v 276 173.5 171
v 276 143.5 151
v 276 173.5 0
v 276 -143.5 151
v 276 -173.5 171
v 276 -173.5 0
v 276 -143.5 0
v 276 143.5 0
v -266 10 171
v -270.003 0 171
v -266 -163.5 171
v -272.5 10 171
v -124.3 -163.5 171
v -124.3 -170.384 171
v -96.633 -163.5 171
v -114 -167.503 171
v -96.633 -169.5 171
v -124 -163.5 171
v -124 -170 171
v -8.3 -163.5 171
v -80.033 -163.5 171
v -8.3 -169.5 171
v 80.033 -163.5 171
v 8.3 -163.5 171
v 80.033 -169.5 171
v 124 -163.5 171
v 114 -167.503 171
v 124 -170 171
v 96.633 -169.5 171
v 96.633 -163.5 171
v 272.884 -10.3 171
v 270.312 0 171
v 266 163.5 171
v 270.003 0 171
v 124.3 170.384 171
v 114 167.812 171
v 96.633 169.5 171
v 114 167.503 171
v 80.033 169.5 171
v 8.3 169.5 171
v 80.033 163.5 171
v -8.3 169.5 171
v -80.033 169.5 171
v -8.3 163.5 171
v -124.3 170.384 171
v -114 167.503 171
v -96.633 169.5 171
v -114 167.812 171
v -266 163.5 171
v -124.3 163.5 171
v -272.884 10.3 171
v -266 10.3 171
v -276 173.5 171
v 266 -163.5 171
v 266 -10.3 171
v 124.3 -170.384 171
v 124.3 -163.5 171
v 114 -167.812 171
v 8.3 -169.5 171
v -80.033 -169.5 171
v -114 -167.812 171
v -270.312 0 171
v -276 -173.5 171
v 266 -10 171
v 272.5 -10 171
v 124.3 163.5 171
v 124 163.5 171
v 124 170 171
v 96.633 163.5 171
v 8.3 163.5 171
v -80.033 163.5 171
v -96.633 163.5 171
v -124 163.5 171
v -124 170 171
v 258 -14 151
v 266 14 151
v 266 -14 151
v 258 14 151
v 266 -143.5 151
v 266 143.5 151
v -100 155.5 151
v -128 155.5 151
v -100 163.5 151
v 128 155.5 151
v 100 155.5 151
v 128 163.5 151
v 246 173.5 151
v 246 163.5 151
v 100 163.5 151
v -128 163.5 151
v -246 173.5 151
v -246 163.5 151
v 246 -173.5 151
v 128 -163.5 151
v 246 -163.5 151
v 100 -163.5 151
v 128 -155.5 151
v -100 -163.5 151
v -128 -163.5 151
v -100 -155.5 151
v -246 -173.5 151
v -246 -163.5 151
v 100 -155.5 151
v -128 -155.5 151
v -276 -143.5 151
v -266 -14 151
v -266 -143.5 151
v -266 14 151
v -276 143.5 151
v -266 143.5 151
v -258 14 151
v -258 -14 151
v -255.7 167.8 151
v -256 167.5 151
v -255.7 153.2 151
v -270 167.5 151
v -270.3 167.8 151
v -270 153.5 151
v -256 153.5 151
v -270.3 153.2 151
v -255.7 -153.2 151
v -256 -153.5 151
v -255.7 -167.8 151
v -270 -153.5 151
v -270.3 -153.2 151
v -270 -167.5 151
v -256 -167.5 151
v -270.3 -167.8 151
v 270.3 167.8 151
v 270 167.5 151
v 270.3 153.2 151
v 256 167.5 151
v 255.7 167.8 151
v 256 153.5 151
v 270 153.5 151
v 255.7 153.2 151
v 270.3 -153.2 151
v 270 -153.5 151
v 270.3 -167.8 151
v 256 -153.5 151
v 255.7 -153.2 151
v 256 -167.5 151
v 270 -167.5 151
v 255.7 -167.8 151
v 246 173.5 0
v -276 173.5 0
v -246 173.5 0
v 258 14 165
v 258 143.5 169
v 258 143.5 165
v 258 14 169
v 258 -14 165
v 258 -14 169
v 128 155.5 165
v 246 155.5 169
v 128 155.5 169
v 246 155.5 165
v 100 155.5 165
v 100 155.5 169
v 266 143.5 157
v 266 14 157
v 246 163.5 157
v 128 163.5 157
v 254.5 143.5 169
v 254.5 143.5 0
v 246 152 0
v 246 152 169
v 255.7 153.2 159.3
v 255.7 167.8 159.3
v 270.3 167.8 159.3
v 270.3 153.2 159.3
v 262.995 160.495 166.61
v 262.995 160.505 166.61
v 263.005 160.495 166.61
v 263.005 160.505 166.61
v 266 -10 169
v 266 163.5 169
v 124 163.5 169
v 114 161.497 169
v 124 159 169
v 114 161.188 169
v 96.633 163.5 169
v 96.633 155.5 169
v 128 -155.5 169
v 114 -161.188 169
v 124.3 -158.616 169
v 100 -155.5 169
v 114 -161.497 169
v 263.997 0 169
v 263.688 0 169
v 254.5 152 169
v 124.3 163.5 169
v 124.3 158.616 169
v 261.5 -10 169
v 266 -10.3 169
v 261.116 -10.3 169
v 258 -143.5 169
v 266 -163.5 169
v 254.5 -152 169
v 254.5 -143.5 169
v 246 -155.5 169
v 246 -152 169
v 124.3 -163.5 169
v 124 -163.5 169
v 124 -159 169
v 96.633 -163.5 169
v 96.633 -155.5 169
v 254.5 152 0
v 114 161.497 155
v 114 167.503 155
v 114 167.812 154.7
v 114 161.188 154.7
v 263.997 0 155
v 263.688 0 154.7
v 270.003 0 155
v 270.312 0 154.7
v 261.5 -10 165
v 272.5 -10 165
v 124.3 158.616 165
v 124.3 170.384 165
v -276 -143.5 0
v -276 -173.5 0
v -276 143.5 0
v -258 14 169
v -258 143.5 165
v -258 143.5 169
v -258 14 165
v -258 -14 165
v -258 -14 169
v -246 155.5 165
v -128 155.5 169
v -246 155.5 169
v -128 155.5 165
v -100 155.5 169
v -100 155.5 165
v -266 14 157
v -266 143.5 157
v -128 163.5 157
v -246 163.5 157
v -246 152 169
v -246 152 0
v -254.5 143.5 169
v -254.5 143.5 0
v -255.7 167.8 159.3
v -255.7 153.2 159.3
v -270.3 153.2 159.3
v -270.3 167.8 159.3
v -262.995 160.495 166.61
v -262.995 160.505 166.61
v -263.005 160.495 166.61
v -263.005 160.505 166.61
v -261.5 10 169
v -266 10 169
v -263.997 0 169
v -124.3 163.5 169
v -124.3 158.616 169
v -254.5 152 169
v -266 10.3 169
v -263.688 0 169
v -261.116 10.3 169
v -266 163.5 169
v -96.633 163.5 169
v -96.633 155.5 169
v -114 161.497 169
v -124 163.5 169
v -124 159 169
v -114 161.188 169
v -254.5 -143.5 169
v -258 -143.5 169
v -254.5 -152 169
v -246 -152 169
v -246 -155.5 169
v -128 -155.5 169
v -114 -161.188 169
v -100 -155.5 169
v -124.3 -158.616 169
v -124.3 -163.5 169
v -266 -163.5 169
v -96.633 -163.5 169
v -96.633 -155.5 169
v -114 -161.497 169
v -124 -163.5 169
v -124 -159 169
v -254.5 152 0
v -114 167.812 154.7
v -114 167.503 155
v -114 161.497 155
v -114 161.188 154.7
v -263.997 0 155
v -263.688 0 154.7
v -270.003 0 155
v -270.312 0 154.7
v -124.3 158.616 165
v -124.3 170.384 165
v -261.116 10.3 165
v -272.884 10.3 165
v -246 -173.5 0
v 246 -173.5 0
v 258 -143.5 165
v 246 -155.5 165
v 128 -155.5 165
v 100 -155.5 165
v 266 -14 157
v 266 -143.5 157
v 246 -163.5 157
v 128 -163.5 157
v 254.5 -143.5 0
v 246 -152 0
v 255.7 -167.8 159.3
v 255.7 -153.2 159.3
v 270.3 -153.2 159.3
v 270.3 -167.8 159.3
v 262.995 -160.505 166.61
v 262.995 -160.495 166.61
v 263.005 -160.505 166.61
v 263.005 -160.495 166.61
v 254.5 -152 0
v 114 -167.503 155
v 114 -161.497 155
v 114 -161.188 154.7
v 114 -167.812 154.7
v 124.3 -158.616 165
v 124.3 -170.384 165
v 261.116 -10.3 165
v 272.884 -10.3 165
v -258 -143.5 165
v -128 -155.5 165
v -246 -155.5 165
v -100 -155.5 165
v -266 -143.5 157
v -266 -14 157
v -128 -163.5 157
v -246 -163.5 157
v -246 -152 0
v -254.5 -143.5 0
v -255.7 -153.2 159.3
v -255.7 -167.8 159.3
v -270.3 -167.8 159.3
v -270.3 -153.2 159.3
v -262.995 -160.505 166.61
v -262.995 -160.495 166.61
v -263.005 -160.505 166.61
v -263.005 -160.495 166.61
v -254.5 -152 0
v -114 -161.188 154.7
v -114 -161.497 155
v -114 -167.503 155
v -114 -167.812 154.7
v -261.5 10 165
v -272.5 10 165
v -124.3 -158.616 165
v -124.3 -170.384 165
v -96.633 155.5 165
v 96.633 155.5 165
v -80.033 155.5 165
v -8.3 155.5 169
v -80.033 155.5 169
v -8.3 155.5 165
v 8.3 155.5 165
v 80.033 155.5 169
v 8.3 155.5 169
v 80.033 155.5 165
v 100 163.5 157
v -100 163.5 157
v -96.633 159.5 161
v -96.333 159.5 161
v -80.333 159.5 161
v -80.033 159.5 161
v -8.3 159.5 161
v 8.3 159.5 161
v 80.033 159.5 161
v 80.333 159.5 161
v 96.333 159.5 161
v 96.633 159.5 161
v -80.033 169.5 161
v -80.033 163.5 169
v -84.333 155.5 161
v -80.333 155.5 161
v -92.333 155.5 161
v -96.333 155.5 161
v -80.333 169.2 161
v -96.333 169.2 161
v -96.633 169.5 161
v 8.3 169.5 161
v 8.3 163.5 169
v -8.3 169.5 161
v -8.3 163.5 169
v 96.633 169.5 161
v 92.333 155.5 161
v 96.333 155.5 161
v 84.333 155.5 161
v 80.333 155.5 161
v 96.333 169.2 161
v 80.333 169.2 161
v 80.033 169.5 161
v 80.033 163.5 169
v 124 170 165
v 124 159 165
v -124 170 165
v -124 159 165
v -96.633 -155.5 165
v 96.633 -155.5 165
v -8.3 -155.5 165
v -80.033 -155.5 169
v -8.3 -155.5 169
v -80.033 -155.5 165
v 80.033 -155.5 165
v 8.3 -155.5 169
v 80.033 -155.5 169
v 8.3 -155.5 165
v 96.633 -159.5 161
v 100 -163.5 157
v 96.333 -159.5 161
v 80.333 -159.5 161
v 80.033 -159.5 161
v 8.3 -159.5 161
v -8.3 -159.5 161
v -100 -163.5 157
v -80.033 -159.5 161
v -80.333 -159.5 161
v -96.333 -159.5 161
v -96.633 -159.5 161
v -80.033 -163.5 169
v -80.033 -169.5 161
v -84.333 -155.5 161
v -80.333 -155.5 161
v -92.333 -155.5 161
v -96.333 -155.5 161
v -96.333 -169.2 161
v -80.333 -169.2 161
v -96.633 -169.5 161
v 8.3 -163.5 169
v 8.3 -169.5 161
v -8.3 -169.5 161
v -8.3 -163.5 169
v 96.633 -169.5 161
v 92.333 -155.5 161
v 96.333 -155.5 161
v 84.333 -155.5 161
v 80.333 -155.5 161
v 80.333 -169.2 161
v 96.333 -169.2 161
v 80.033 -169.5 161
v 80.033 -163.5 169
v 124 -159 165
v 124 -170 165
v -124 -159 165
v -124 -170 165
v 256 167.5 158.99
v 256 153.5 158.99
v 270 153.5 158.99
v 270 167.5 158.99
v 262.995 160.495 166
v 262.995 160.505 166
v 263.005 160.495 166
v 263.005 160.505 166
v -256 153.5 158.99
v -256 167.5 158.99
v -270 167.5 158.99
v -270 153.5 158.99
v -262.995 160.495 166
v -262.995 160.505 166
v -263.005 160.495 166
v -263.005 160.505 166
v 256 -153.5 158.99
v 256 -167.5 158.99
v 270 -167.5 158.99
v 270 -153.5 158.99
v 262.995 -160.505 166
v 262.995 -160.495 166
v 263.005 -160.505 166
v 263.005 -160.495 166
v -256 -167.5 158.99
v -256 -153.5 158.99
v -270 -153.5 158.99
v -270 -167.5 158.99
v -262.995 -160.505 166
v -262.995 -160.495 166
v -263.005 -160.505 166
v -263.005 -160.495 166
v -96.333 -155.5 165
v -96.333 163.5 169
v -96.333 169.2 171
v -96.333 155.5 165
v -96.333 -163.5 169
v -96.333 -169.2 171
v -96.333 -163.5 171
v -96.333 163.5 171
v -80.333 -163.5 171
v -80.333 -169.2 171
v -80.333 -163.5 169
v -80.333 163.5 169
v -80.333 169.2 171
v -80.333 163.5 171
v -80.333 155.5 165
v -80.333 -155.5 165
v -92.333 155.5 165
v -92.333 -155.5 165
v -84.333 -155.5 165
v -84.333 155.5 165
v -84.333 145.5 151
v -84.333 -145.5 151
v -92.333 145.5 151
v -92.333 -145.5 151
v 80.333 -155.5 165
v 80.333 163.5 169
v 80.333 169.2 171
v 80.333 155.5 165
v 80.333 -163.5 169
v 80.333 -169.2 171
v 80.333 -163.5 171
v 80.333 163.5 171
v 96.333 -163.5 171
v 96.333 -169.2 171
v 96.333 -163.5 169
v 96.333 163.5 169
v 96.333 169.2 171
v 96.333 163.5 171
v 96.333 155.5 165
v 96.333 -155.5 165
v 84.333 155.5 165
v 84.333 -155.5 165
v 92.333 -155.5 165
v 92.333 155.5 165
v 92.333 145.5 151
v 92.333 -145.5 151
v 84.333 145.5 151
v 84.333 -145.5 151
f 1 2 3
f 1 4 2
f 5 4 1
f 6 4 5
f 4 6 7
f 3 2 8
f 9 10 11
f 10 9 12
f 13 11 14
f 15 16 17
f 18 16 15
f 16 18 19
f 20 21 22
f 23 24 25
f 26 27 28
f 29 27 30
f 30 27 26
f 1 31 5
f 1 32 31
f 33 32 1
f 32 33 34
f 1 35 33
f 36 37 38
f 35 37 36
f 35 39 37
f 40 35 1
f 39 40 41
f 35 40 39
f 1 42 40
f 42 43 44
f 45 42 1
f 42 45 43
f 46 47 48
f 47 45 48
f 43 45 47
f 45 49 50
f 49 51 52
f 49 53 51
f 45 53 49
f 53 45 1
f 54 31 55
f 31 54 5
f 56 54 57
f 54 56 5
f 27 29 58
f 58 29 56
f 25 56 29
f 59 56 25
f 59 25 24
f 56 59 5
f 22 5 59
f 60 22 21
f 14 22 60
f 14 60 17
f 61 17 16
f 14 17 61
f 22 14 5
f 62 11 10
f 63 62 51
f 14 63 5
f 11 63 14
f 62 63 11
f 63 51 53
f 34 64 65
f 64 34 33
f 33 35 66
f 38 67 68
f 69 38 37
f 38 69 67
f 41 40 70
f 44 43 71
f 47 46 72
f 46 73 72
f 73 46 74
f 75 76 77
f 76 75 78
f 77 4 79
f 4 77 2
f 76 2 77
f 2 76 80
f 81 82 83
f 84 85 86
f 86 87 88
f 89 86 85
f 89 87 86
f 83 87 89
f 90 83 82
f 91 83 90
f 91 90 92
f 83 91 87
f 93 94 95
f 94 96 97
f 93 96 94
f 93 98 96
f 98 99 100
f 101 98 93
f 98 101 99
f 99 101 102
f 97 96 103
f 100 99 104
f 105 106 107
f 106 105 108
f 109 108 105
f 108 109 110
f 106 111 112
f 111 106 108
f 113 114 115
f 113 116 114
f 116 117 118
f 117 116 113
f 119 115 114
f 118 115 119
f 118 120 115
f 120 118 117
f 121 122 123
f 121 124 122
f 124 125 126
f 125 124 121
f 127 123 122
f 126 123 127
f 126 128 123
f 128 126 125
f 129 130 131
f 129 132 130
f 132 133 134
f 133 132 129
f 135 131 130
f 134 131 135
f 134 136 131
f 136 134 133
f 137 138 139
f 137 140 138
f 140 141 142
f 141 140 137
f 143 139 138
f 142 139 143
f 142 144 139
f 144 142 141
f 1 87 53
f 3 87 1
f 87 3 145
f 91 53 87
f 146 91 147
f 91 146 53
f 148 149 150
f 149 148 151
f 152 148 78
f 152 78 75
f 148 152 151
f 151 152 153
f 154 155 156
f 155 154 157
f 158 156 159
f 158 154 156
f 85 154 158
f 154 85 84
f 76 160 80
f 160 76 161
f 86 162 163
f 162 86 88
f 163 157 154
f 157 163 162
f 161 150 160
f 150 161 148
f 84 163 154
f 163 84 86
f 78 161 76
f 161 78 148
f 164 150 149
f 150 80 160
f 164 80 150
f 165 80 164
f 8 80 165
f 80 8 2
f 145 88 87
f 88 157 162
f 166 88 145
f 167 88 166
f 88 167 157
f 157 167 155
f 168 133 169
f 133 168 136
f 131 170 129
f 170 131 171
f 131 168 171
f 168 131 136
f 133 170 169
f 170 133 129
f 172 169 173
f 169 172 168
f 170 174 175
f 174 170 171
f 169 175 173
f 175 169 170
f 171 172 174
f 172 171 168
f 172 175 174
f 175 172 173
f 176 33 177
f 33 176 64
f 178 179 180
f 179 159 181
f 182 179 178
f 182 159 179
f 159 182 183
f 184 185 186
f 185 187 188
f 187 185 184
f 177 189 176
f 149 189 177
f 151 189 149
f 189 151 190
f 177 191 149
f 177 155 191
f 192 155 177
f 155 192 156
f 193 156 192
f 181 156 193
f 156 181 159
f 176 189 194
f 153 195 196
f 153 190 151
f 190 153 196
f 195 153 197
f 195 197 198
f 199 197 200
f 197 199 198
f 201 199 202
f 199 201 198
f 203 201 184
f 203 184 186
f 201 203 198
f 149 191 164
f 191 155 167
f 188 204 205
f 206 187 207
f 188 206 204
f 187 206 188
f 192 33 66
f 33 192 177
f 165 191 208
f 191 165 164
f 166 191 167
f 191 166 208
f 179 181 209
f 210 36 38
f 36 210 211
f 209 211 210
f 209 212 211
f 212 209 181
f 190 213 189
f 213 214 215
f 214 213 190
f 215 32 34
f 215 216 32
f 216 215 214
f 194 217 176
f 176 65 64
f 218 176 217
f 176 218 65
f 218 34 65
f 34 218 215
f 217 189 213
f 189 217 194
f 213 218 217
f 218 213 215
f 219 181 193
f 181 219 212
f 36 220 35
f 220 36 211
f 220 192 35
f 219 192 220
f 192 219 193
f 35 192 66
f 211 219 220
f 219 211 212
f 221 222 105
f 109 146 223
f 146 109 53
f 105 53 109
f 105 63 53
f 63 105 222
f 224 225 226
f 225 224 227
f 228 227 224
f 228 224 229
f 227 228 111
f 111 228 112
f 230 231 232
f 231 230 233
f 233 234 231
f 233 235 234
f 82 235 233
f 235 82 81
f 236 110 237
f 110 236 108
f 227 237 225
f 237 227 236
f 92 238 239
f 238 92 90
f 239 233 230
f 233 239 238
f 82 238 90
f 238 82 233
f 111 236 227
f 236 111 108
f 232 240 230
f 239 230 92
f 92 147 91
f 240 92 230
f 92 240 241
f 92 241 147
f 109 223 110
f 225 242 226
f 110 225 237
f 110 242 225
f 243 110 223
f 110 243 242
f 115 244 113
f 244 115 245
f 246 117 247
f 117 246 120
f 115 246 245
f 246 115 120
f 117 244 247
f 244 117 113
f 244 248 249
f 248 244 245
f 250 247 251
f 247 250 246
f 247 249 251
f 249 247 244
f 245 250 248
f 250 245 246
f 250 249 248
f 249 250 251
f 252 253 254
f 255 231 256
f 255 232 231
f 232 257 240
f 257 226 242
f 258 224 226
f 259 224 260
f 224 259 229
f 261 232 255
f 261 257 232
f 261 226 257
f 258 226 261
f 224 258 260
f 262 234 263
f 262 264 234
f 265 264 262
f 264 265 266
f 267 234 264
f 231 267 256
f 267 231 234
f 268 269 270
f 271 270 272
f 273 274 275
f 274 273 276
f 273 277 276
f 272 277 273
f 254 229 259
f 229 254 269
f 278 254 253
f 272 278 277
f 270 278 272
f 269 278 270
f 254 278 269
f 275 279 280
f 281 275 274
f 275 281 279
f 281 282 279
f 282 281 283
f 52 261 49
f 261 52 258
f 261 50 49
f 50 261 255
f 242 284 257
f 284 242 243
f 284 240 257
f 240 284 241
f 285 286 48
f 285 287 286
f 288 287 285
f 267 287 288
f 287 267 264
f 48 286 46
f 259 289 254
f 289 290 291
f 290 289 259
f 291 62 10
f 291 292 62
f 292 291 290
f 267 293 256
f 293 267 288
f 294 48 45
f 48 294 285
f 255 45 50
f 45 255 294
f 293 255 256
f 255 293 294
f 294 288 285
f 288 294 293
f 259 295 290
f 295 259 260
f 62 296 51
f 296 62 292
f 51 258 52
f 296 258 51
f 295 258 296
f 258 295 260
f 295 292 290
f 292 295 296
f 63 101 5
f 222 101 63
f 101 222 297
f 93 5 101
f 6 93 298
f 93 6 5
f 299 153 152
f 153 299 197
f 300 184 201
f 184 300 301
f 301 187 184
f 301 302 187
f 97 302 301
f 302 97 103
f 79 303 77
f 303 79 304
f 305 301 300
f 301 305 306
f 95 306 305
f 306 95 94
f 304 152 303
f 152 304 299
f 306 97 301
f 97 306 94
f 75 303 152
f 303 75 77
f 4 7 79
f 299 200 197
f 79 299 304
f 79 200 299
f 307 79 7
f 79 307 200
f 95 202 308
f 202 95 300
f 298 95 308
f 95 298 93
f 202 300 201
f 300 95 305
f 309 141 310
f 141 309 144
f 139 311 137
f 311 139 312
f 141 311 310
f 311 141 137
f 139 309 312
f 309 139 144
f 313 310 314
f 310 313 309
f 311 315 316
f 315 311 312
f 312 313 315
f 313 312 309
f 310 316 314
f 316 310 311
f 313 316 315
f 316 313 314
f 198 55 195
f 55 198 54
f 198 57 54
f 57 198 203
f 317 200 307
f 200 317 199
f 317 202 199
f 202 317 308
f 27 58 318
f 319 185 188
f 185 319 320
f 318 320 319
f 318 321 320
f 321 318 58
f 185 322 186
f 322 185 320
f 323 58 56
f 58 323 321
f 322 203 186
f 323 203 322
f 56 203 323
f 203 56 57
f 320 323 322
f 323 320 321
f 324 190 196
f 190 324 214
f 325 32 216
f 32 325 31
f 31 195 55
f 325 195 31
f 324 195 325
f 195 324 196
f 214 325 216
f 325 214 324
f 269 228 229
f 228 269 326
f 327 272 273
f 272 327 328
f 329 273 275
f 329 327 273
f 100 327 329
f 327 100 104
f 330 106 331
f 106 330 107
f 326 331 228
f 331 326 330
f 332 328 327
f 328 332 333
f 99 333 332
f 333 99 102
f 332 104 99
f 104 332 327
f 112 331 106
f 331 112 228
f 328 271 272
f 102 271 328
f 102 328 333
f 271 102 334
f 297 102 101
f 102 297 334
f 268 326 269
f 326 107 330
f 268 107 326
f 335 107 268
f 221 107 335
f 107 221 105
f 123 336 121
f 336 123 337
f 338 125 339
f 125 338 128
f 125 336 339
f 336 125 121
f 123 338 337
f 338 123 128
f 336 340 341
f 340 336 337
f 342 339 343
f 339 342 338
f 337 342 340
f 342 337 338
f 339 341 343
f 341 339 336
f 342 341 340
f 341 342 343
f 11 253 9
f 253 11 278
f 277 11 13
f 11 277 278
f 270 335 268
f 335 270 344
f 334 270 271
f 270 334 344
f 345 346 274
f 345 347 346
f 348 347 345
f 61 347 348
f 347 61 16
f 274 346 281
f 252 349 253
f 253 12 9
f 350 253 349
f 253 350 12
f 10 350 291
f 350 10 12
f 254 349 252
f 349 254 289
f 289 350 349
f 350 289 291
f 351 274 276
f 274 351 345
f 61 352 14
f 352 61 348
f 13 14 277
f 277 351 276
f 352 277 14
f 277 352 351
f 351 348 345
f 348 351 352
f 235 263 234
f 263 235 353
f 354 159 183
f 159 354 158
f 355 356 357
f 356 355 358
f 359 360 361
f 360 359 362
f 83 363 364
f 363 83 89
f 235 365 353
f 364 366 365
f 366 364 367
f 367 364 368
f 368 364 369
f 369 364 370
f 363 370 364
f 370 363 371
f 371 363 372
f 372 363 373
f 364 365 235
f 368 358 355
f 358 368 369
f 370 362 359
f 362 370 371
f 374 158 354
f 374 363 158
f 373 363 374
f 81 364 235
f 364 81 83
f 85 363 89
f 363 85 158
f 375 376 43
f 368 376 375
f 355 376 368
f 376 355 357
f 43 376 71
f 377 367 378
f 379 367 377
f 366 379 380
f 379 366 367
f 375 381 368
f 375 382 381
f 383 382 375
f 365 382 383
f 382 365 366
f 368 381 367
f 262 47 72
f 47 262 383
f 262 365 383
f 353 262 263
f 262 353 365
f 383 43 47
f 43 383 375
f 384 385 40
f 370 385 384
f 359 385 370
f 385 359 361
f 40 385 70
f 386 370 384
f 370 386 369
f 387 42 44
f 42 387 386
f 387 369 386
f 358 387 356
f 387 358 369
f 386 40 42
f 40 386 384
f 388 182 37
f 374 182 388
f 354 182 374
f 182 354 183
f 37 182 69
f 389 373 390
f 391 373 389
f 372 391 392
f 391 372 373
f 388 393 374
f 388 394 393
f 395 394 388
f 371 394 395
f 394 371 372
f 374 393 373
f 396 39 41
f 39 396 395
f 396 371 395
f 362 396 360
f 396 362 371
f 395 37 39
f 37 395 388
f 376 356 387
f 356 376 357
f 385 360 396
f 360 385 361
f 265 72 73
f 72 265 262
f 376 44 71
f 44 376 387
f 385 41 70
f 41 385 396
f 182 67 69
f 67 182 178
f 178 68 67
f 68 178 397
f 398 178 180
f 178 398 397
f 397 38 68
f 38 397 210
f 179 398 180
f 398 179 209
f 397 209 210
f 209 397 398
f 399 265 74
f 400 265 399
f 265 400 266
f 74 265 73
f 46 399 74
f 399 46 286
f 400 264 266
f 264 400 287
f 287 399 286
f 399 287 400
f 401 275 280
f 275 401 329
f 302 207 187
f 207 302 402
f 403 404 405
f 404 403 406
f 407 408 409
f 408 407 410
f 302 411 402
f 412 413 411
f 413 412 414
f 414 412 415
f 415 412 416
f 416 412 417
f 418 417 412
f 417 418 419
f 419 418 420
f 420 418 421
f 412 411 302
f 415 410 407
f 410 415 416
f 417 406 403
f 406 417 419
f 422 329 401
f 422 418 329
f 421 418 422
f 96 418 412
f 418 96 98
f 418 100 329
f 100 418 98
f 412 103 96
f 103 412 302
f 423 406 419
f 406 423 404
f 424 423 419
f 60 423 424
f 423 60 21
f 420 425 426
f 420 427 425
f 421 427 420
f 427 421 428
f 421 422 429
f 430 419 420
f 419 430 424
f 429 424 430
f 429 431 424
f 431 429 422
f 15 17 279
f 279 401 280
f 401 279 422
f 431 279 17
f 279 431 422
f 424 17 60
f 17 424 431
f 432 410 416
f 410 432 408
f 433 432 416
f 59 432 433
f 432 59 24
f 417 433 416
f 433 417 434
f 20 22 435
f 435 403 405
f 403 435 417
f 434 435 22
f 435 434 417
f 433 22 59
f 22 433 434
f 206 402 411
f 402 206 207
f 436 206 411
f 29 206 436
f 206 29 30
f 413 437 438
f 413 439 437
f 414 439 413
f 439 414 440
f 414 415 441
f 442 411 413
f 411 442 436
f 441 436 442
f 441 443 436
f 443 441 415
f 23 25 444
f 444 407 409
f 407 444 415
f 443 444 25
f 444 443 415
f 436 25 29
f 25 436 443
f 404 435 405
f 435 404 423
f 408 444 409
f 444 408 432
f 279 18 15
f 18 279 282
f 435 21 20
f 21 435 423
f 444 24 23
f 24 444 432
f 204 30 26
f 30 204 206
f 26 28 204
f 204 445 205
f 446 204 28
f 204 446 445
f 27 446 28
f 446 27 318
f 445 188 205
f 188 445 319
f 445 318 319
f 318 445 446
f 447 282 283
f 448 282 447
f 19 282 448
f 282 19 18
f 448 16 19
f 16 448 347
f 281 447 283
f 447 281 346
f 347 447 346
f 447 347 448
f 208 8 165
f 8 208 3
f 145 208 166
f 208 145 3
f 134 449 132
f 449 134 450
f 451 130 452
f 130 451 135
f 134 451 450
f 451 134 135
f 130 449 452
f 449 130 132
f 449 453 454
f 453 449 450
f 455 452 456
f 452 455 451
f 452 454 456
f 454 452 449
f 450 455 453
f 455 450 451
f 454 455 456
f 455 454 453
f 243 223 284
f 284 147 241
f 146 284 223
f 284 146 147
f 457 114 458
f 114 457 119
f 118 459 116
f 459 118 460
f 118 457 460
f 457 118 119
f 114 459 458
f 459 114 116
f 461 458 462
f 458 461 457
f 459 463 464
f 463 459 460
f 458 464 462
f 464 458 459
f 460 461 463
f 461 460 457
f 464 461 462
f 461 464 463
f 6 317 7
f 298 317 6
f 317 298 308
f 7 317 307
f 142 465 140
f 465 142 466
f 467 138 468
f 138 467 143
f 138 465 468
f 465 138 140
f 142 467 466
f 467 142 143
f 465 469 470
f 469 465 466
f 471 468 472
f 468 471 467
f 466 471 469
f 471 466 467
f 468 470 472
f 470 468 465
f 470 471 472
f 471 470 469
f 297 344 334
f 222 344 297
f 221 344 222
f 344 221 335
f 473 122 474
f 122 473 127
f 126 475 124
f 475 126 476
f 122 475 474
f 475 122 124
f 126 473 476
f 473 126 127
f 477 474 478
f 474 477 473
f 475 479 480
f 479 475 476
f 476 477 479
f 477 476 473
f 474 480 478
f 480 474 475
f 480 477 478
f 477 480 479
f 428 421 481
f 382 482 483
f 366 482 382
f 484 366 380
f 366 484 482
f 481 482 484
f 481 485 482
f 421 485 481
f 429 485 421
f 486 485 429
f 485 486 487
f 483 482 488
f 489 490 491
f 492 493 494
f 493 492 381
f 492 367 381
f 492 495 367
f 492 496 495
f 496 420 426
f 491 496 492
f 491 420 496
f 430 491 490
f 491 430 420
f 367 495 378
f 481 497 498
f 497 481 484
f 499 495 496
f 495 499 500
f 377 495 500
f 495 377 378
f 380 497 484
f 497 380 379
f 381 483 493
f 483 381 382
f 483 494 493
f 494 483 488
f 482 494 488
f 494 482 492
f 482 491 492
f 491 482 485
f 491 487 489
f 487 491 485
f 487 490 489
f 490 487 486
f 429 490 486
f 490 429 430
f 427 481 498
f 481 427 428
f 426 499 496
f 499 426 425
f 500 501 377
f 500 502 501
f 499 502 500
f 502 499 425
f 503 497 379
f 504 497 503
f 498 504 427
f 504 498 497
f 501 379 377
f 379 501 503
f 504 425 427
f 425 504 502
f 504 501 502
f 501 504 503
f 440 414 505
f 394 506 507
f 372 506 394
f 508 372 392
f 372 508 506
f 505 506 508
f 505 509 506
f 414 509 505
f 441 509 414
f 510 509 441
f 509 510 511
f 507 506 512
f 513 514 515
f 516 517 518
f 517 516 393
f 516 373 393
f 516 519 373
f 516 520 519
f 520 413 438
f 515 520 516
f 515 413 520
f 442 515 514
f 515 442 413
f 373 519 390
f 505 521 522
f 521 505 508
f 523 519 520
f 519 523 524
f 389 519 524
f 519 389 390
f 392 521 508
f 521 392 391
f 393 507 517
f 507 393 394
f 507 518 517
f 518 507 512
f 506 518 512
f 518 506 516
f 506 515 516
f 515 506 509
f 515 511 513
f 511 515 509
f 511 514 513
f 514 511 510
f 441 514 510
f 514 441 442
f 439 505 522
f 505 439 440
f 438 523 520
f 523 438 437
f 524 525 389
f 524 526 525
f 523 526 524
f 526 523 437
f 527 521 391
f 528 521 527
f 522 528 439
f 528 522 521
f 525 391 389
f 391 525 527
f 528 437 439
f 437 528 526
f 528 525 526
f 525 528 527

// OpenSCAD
// Challenge 01: GN 1/1 insert frame on legs (type A), OpenSCAD baseline.
// Spec: ../DESIGN.md (v1). Units mm. X = 530 side, Y = 325 side, Z up.
//
// Export one part:   openscad -o corner_ne.stl -D 'part="corner_ne"' gn_holder.scad
// Parts: corner_ne corner_nw corner_se corner_sw middle_n middle_s leg divider
// Views: assembly (default), exploded, frame (all rail parts, assembled, no legs)

/* [Selector] */
part = "assembly";

/* [DESIGN.md parameters] */
gn_l      = 530;   // GN 1/1 nominal (outer rim), long side
gn_w      = 325;   // GN 1/1 nominal, short side
play      = 1.0;   // gap per side between pan rim and frame
rim_w     = 12.5;  // pan rim width (estimate)
ledge_w   = 8;     // ledge reach under the rim, inward from the opening
ledge_t   = 4;     // ledge thickness
rim_t     = 2;     // pan rim thickness = rim pocket depth (rim ends flush)
wall      = 10;    // frame wall outside the opening
bar_h     = 20;    // frame rail height
max_depth = 150;   // deepest pan
clear     = 15;    // clearance under the deepest pan
leg       = 30;    // leg cross-section (square)
div_w     = 16;    // divider bar width
tol       = 0.3;   // fit tolerance for joints and removable parts
bed_x     = 256;   // printer bed
bed_y     = 256;

/* [Layout] */
// Pans along the 530 side (each 325 deep). Dividers go between them.
layout    = ["1/3", "1/3", "1/3"];
// "all": seats at every 1/2 and 1/3 position (also serves 2/3 + 1/3); "layout": only where `layout` needs them
seat_mode = "all";

/* [Joint and detail parameters (not in DESIGN.md)] */
split_x   = 114;   // long rails are cut at x = +-split_x (middle part 2*split_x + 2*dt_len)
boss_len  = 28;    // solid rail section (chamfer void filled) around each joint
dt_u      = 9;     // dovetail centre, measured inward from the outer face
dt_neck   = 6;     // dovetail width at the joint plane
dt_head   = 11;    // dovetail width at its end
dt_len    = 10;    // dovetail length
dt_floor  = 4;     // dovetail underside starts here at the joint plane, rises at 45 deg
seat_in   = 4;     // outer skin left behind a divider seat
div_web   = 8;     // divider web width (between two pan bodies)
pan_c     = 2;     // extra clearance around the pan body (gn - 2*rim_w) at legs/corners
tenon     = 14;    // leg tenon (square)
tenon_h   = 8;     // straight part of the tenon; a 45 deg pyramid sits on top
tenon_u   = 13;    // tenon centre, inward from both outer faces
explode   = 40;    // gap for part="exploded"
slice_z   = 170;   // part="slice": 2D cut of frame + legs at this height (absolute z), for measuring

/* [Derived] */
op_l   = gn_l + 2*play;            // 532  rim pocket / opening
op_w   = gn_w + 2*play;            // 327
hole_l = op_l - 2*ledge_w;         // 516  through-hole under the ledge
hole_w = op_w - 2*ledge_w;         // 311
out_l  = op_l + 2*wall;            // 552  outer frame
out_w  = op_w + 2*wall;            // 347
band   = wall + ledge_w;           // 18   rail width at the ledge level
ledge_top = bar_h - rim_t;         // 18   (rail-local z)
ledge_bot = ledge_top - ledge_t;   // 14
cham_z    = ledge_bot - ledge_w;   // 6    45 deg gusset under the ledge ends here
seat_z    = ledge_bot - ledge_t;   // 10   divider seat floor
z0     = max_depth + clear - ledge_bot;  // 151 rail bottom above floor (= leg height)
pan_l  = gn_l - 2*rim_w + 2*pan_c; // 509 pan body envelope kept free
pan_w  = gn_w - 2*rim_w + 2*pan_c; // 304
notch_u = out_l/2 - pan_l/2;       // 21.5 legs/corner blocks stop here (inner corner)

assert(cham_z >= 0, "bar_h too small for ledge + 45 deg gusset");
assert(seat_z >= 0);
assert(2*split_x + 2*dt_len <= max(bed_x, bed_y), "middle rail part too long for the bed");
assert(out_l/2 - split_x <= max(bed_x, bed_y));
assert(dt_u + dt_head/2 + tol < band - 2 && dt_u - dt_head/2 - tol > 2, "dovetail walls too thin");
assert(dt_len + tol < boss_len/2);

big = 1000;
eps = 0.01;

// ---------- layout ----------
fr_tab = [["1/1",1],["2/3",2/3],["1/2",1/2],["1/3",1/3]];
function frac(s) = fr_tab[search([s], fr_tab)[0]][1];
function cum(l, k) = k == 0 ? 0 : cum(l, k-1) + frac(l[k-1]);
assert(abs(cum(layout, len(layout)) - 1) < 1e-6, "layout fractions must add up to 1/1");
div_x   = len(layout) > 1 ? [for (k = [1:len(layout)-1]) -gn_l/2 + cum(layout, k)*gn_l] : [];
all_x   = [-gn_l/6, 0, gn_l/6];   // 1/3, 1/2 (and 2/3 + 1/3), 2/3
seats_x = seat_mode == "all" ? all_x : div_x;
echo(str("derived: opening ", op_l, "x", op_w, ", through-hole ", hole_l, "x", hole_w,
         ", outer ", out_l, "x", out_w, ", rail bottom z0 ", z0,
         ", ledge underside ", z0 + ledge_bot, ", top ", z0 + bar_h));
echo(str("dividers at x = ", div_x, ", seats at x = ", seats_x));

// ---------- helpers ----------
// box on a long rail (sy = +-1), u measured inward from the outer face
module rail_box(sy, x0, x1, u0, u1, zz0, zz1) {
    y0 = sy > 0 ? out_w/2 - u1 : -out_w/2 + u0;
    translate([x0, y0, zz0]) cube([x1 - x0, u1 - u0, zz1 - zz0]);
}
// local joint frame: s along `sd` (direction the tail points), u along `ud` (inward)
module jframe(p, sd, ud)
    multmatrix([[sd[0], ud[0], 0, p[0]], [sd[1], ud[1], 0, p[1]], [0, 0, 1, 0], [0, 0, 0, 1]])
        children();

// joints: [origin on outer face, tail direction, inward direction, tail owner, socket owner]
joints = [
    [[ split_x,  out_w/2], [ 1, 0], [0, -1], "middle_n", "corner_ne"],
    [[-split_x,  out_w/2], [-1, 0], [0, -1], "middle_n", "corner_nw"],
    [[ split_x, -out_w/2], [ 1, 0], [0,  1], "middle_s", "corner_se"],
    [[-split_x, -out_w/2], [-1, 0], [0,  1], "middle_s", "corner_sw"],
    [[ out_l/2, 0], [0, -1], [-1, 0], "corner_ne", "corner_se"],
    [[-out_l/2, 0], [0,  1], [ 1, 0], "corner_sw", "corner_nw"],
];

module dt_profile(g) {
    offset(delta = g) polygon([[-eps, dt_u - dt_neck/2], [dt_len, dt_u - dt_head/2],
                               [dt_len, dt_u + dt_head/2], [-eps, dt_u + dt_neck/2]]);
    if (g > 0) translate([-1, dt_u - dt_neck/2 - g]) square([1 + eps, dt_neck + 2*g]);
}
// underside rises at 45 deg away from the joint plane, so the tail prints without support
module dt_ramp(g, ztop)
    rotate([90, 0, 0]) linear_extrude(height = 200, center = true)
        polygon([[-5, dt_floor - g - 5], [dt_len + 5, dt_floor - g + dt_len + 5], [dt_len + 5, ztop], [-5, ztop]]);
module dt_tail()   intersection() { linear_extrude(bar_h) dt_profile(0); dt_ramp(0, bar_h); }
module dt_socket() intersection() { translate([0, 0, -1]) linear_extrude(bar_h + 2) dt_profile(tol); dt_ramp(tol, bar_h + 1); }

// leg tenon / socket in local corner coords (u, u from the outer corner)
module tenon_shape(g, zbase) {
    s = tenon + 2*g;
    translate([tenon_u, tenon_u, 0]) {
        translate([-s/2, -s/2, zbase]) cube([s, s, tenon_h + g - zbase]);
        hull() {
            translate([-s/2, -s/2, tenon_h + g - eps]) cube([s, s, eps]);
            translate([-eps/2, -eps/2, tenon_h + g + s/2]) cube([eps, eps, eps]);
        }
    }
}
// place children (built for the NE corner, local u = inward) at corner (sx, sy)
module at_corner(sx, sy)
    translate([sx*out_l/2, sy*out_w/2, 0]) mirror([sx > 0 ? 1 : 0, 0, 0]) mirror([0, sy > 0 ? 1 : 0, 0]) children();

corners = [[1, 1], [-1, 1], [1, -1], [-1, -1]];

// ---------- frame (rail-local z: 0 = rail bottom) ----------
module ring() difference() {
    translate([-out_l/2, -out_w/2, 0]) cube([out_l, out_w, bar_h]);
    cube([hole_l, hole_w, 3*bar_h], center = true);
    hull() {   // void under the ledge, 45 deg gusset
        translate([-op_l/2, -op_w/2, -1]) cube([op_l, op_w, cham_z + 1]);
        translate([-hole_l/2, -hole_w/2, -1]) cube([hole_l, hole_w, ledge_bot + 1]);
    }
}
module pocket() translate([-op_l/2, -op_w/2, ledge_top]) cube([op_l, op_w, bar_h]);
module pan_box() cube([pan_l, pan_w, big], center = true);
module bosses() {
    for (sy = [-1, 1], sx = [-1, 1]) rail_box(sy, sx*split_x - boss_len/2, sx*split_x + boss_len/2, 0, band, 0, bar_h);
    for (sx = [-1, 1]) translate([sx > 0 ? out_l/2 - band : -out_l/2, -boss_len/2, 0]) cube([band, boss_len, bar_h]);
}
module corner_blocks() for (c = corners) at_corner(c[0], c[1]) cube([leg, leg, bar_h]);
module seat_slots() for (x = seats_x, sy = [-1, 1])
    rail_box(sy, x - div_w/2 - tol, x + div_w/2 + tol, seat_in, band + 1, seat_z, bar_h + 1);
module leg_sockets() for (c = corners) at_corner(c[0], c[1]) tenon_shape(tol, -1);

module frame_raw() render() difference() {
    union() { ring(); bosses(); corner_blocks(); }
    pocket(); pan_box(); seat_slots(); leg_sockets();
}

function region(name) =   // [x0, x1, y0, y1]
    name == "middle_n"  ? [-split_x, split_x, 0, big] :
    name == "middle_s"  ? [-split_x, split_x, -big, 0] :
    name == "corner_ne" ? [ split_x,  big, 0,  big] :
    name == "corner_nw" ? [-big, -split_x, 0,  big] :
    name == "corner_se" ? [ split_x,  big, -big, 0] :
                          [-big, -split_x, -big, 0];   // corner_sw

module rail_part(name) {
    r = region(name);
    render() difference() {
        union() {
            intersection() {
                frame_raw();
                translate([r[0], r[2], -1]) cube([r[1] - r[0], r[3] - r[2], bar_h + 2]);
            }
            for (j = joints) if (j[3] == name) jframe(j[0], j[1], j[2]) dt_tail();
        }
        pocket();
        for (j = joints) if (j[4] == name) jframe(j[0], j[1], j[2]) dt_socket();
    }
}

// ---------- legs (absolute z: 0 = floor) ----------
module leg_local() {   // NE corner, local u inward
    difference() {
        cube([leg, leg, z0]);
        translate([notch_u, notch_u, -1]) cube([leg, leg, z0 + 2]);
    }
    translate([0, 0, z0 - eps]) tenon_shape(0, 0);
}

// ---------- divider (rail-local z), world position x = xd ----------
module divider_at(xd) {
    Y1 = out_w/2 - seat_in - tol;   // end of the bar, inside the seat
    Y2 = out_w/2 - wall;            // rail inner face (opening edge)
    Y3 = out_w/2 - band;            // ledge tip (through-hole edge)
    translate([xd, 0, 0]) rotate([90, 0, 90]) {
        linear_extrude(height = div_w, center = true) polygon([
            [-Y1, seat_z], [-Y3, seat_z], [-Y3, ledge_bot], [Y3, ledge_bot], [Y3, seat_z], [Y1, seat_z],
            [Y1, bar_h], [Y2, bar_h], [Y2, ledge_top], [-Y2, ledge_top], [-Y2, bar_h], [-Y1, bar_h]]);
        linear_extrude(height = div_web, center = true) polygon([
            [-Y3, seat_z], [-Y3 + seat_z, 0], [Y3 - seat_z, 0], [Y3, seat_z], [Y3, ledge_bot + 1], [-Y3, ledge_bot + 1]]);
    }
}

// ---------- views ----------
rail_names = ["corner_ne", "corner_nw", "corner_se", "corner_sw", "middle_n", "middle_s"];
function rcol(n) = n == "middle_n" || n == "middle_s" ? "SteelBlue" : (n == "corner_ne" || n == "corner_sw") ? "Orange" : "Gold";

module assembly(e = 0, dividers = true) {
    for (n = rail_names) {
        r = region(n);
        dx = n == "middle_n" || n == "middle_s" ? 0 : sign(r[0] + r[1]) * e;
        dy = sign(r[2] + r[3]) * e;
        color(rcol(n)) translate([dx, dy, z0 + e]) rail_part(n);
    }
    for (c = corners) color("DimGray")
        translate([c[0]*e, c[1]*e, -e*0.0]) at_corner(c[0], c[1]) leg_local();
    if (dividers) for (x = div_x) color("SeaGreen") translate([0, 0, z0 + 3*e]) divider_at(x);
}

// print orientation for each exported part, roughly centred on the origin
if (part == "assembly") assembly(0);
else if (part == "exploded") assembly(explode);
else if (part == "slice") projection(cut = true) translate([0, 0, -slice_z]) assembly(0, false);
else if (part == "overlap") {   // must come out empty: every pair of assembled parts intersected
    n = len(rail_names);
    for (i = [0:n-1], j = [0:n-1]) if (i < j)
        intersection() { rail_part(rail_names[i]); rail_part(rail_names[j]); }
    for (i = [0:n-1], x = div_x) intersection() { rail_part(rail_names[i]); divider_at(x); }
    for (i = [0:n-1], c = corners) intersection() { translate([0, 0, z0]) rail_part(rail_names[i]); at_corner(c[0], c[1]) leg_local(); }
}
else if (part == "frame") for (n = rail_names) rail_part(n);
else if (part == "leg") translate([-leg/2, -leg/2, 0]) leg_local();
else if (part == "divider")   // lying on its side, turned 45 deg to fit the bed diagonal
    rotate([0, 0, 45]) translate([bar_h/2, 0, div_w/2]) rotate([0, -90, 0]) divider_at(0);
else if (search([part], rail_names)[0] != []) {
    r = region(part);
    cx = max(-out_l/2, r[0]) + (min(out_l/2, r[1]) - max(-out_l/2, r[0]))/2;
    cy = max(-out_w/2, r[2]) + (min(out_w/2, r[3]) - max(-out_w/2, r[2]))/2;
    translate([-cx, -cy, 0]) rail_part(part);
}
else assert(false, str("unknown part: ", part));
